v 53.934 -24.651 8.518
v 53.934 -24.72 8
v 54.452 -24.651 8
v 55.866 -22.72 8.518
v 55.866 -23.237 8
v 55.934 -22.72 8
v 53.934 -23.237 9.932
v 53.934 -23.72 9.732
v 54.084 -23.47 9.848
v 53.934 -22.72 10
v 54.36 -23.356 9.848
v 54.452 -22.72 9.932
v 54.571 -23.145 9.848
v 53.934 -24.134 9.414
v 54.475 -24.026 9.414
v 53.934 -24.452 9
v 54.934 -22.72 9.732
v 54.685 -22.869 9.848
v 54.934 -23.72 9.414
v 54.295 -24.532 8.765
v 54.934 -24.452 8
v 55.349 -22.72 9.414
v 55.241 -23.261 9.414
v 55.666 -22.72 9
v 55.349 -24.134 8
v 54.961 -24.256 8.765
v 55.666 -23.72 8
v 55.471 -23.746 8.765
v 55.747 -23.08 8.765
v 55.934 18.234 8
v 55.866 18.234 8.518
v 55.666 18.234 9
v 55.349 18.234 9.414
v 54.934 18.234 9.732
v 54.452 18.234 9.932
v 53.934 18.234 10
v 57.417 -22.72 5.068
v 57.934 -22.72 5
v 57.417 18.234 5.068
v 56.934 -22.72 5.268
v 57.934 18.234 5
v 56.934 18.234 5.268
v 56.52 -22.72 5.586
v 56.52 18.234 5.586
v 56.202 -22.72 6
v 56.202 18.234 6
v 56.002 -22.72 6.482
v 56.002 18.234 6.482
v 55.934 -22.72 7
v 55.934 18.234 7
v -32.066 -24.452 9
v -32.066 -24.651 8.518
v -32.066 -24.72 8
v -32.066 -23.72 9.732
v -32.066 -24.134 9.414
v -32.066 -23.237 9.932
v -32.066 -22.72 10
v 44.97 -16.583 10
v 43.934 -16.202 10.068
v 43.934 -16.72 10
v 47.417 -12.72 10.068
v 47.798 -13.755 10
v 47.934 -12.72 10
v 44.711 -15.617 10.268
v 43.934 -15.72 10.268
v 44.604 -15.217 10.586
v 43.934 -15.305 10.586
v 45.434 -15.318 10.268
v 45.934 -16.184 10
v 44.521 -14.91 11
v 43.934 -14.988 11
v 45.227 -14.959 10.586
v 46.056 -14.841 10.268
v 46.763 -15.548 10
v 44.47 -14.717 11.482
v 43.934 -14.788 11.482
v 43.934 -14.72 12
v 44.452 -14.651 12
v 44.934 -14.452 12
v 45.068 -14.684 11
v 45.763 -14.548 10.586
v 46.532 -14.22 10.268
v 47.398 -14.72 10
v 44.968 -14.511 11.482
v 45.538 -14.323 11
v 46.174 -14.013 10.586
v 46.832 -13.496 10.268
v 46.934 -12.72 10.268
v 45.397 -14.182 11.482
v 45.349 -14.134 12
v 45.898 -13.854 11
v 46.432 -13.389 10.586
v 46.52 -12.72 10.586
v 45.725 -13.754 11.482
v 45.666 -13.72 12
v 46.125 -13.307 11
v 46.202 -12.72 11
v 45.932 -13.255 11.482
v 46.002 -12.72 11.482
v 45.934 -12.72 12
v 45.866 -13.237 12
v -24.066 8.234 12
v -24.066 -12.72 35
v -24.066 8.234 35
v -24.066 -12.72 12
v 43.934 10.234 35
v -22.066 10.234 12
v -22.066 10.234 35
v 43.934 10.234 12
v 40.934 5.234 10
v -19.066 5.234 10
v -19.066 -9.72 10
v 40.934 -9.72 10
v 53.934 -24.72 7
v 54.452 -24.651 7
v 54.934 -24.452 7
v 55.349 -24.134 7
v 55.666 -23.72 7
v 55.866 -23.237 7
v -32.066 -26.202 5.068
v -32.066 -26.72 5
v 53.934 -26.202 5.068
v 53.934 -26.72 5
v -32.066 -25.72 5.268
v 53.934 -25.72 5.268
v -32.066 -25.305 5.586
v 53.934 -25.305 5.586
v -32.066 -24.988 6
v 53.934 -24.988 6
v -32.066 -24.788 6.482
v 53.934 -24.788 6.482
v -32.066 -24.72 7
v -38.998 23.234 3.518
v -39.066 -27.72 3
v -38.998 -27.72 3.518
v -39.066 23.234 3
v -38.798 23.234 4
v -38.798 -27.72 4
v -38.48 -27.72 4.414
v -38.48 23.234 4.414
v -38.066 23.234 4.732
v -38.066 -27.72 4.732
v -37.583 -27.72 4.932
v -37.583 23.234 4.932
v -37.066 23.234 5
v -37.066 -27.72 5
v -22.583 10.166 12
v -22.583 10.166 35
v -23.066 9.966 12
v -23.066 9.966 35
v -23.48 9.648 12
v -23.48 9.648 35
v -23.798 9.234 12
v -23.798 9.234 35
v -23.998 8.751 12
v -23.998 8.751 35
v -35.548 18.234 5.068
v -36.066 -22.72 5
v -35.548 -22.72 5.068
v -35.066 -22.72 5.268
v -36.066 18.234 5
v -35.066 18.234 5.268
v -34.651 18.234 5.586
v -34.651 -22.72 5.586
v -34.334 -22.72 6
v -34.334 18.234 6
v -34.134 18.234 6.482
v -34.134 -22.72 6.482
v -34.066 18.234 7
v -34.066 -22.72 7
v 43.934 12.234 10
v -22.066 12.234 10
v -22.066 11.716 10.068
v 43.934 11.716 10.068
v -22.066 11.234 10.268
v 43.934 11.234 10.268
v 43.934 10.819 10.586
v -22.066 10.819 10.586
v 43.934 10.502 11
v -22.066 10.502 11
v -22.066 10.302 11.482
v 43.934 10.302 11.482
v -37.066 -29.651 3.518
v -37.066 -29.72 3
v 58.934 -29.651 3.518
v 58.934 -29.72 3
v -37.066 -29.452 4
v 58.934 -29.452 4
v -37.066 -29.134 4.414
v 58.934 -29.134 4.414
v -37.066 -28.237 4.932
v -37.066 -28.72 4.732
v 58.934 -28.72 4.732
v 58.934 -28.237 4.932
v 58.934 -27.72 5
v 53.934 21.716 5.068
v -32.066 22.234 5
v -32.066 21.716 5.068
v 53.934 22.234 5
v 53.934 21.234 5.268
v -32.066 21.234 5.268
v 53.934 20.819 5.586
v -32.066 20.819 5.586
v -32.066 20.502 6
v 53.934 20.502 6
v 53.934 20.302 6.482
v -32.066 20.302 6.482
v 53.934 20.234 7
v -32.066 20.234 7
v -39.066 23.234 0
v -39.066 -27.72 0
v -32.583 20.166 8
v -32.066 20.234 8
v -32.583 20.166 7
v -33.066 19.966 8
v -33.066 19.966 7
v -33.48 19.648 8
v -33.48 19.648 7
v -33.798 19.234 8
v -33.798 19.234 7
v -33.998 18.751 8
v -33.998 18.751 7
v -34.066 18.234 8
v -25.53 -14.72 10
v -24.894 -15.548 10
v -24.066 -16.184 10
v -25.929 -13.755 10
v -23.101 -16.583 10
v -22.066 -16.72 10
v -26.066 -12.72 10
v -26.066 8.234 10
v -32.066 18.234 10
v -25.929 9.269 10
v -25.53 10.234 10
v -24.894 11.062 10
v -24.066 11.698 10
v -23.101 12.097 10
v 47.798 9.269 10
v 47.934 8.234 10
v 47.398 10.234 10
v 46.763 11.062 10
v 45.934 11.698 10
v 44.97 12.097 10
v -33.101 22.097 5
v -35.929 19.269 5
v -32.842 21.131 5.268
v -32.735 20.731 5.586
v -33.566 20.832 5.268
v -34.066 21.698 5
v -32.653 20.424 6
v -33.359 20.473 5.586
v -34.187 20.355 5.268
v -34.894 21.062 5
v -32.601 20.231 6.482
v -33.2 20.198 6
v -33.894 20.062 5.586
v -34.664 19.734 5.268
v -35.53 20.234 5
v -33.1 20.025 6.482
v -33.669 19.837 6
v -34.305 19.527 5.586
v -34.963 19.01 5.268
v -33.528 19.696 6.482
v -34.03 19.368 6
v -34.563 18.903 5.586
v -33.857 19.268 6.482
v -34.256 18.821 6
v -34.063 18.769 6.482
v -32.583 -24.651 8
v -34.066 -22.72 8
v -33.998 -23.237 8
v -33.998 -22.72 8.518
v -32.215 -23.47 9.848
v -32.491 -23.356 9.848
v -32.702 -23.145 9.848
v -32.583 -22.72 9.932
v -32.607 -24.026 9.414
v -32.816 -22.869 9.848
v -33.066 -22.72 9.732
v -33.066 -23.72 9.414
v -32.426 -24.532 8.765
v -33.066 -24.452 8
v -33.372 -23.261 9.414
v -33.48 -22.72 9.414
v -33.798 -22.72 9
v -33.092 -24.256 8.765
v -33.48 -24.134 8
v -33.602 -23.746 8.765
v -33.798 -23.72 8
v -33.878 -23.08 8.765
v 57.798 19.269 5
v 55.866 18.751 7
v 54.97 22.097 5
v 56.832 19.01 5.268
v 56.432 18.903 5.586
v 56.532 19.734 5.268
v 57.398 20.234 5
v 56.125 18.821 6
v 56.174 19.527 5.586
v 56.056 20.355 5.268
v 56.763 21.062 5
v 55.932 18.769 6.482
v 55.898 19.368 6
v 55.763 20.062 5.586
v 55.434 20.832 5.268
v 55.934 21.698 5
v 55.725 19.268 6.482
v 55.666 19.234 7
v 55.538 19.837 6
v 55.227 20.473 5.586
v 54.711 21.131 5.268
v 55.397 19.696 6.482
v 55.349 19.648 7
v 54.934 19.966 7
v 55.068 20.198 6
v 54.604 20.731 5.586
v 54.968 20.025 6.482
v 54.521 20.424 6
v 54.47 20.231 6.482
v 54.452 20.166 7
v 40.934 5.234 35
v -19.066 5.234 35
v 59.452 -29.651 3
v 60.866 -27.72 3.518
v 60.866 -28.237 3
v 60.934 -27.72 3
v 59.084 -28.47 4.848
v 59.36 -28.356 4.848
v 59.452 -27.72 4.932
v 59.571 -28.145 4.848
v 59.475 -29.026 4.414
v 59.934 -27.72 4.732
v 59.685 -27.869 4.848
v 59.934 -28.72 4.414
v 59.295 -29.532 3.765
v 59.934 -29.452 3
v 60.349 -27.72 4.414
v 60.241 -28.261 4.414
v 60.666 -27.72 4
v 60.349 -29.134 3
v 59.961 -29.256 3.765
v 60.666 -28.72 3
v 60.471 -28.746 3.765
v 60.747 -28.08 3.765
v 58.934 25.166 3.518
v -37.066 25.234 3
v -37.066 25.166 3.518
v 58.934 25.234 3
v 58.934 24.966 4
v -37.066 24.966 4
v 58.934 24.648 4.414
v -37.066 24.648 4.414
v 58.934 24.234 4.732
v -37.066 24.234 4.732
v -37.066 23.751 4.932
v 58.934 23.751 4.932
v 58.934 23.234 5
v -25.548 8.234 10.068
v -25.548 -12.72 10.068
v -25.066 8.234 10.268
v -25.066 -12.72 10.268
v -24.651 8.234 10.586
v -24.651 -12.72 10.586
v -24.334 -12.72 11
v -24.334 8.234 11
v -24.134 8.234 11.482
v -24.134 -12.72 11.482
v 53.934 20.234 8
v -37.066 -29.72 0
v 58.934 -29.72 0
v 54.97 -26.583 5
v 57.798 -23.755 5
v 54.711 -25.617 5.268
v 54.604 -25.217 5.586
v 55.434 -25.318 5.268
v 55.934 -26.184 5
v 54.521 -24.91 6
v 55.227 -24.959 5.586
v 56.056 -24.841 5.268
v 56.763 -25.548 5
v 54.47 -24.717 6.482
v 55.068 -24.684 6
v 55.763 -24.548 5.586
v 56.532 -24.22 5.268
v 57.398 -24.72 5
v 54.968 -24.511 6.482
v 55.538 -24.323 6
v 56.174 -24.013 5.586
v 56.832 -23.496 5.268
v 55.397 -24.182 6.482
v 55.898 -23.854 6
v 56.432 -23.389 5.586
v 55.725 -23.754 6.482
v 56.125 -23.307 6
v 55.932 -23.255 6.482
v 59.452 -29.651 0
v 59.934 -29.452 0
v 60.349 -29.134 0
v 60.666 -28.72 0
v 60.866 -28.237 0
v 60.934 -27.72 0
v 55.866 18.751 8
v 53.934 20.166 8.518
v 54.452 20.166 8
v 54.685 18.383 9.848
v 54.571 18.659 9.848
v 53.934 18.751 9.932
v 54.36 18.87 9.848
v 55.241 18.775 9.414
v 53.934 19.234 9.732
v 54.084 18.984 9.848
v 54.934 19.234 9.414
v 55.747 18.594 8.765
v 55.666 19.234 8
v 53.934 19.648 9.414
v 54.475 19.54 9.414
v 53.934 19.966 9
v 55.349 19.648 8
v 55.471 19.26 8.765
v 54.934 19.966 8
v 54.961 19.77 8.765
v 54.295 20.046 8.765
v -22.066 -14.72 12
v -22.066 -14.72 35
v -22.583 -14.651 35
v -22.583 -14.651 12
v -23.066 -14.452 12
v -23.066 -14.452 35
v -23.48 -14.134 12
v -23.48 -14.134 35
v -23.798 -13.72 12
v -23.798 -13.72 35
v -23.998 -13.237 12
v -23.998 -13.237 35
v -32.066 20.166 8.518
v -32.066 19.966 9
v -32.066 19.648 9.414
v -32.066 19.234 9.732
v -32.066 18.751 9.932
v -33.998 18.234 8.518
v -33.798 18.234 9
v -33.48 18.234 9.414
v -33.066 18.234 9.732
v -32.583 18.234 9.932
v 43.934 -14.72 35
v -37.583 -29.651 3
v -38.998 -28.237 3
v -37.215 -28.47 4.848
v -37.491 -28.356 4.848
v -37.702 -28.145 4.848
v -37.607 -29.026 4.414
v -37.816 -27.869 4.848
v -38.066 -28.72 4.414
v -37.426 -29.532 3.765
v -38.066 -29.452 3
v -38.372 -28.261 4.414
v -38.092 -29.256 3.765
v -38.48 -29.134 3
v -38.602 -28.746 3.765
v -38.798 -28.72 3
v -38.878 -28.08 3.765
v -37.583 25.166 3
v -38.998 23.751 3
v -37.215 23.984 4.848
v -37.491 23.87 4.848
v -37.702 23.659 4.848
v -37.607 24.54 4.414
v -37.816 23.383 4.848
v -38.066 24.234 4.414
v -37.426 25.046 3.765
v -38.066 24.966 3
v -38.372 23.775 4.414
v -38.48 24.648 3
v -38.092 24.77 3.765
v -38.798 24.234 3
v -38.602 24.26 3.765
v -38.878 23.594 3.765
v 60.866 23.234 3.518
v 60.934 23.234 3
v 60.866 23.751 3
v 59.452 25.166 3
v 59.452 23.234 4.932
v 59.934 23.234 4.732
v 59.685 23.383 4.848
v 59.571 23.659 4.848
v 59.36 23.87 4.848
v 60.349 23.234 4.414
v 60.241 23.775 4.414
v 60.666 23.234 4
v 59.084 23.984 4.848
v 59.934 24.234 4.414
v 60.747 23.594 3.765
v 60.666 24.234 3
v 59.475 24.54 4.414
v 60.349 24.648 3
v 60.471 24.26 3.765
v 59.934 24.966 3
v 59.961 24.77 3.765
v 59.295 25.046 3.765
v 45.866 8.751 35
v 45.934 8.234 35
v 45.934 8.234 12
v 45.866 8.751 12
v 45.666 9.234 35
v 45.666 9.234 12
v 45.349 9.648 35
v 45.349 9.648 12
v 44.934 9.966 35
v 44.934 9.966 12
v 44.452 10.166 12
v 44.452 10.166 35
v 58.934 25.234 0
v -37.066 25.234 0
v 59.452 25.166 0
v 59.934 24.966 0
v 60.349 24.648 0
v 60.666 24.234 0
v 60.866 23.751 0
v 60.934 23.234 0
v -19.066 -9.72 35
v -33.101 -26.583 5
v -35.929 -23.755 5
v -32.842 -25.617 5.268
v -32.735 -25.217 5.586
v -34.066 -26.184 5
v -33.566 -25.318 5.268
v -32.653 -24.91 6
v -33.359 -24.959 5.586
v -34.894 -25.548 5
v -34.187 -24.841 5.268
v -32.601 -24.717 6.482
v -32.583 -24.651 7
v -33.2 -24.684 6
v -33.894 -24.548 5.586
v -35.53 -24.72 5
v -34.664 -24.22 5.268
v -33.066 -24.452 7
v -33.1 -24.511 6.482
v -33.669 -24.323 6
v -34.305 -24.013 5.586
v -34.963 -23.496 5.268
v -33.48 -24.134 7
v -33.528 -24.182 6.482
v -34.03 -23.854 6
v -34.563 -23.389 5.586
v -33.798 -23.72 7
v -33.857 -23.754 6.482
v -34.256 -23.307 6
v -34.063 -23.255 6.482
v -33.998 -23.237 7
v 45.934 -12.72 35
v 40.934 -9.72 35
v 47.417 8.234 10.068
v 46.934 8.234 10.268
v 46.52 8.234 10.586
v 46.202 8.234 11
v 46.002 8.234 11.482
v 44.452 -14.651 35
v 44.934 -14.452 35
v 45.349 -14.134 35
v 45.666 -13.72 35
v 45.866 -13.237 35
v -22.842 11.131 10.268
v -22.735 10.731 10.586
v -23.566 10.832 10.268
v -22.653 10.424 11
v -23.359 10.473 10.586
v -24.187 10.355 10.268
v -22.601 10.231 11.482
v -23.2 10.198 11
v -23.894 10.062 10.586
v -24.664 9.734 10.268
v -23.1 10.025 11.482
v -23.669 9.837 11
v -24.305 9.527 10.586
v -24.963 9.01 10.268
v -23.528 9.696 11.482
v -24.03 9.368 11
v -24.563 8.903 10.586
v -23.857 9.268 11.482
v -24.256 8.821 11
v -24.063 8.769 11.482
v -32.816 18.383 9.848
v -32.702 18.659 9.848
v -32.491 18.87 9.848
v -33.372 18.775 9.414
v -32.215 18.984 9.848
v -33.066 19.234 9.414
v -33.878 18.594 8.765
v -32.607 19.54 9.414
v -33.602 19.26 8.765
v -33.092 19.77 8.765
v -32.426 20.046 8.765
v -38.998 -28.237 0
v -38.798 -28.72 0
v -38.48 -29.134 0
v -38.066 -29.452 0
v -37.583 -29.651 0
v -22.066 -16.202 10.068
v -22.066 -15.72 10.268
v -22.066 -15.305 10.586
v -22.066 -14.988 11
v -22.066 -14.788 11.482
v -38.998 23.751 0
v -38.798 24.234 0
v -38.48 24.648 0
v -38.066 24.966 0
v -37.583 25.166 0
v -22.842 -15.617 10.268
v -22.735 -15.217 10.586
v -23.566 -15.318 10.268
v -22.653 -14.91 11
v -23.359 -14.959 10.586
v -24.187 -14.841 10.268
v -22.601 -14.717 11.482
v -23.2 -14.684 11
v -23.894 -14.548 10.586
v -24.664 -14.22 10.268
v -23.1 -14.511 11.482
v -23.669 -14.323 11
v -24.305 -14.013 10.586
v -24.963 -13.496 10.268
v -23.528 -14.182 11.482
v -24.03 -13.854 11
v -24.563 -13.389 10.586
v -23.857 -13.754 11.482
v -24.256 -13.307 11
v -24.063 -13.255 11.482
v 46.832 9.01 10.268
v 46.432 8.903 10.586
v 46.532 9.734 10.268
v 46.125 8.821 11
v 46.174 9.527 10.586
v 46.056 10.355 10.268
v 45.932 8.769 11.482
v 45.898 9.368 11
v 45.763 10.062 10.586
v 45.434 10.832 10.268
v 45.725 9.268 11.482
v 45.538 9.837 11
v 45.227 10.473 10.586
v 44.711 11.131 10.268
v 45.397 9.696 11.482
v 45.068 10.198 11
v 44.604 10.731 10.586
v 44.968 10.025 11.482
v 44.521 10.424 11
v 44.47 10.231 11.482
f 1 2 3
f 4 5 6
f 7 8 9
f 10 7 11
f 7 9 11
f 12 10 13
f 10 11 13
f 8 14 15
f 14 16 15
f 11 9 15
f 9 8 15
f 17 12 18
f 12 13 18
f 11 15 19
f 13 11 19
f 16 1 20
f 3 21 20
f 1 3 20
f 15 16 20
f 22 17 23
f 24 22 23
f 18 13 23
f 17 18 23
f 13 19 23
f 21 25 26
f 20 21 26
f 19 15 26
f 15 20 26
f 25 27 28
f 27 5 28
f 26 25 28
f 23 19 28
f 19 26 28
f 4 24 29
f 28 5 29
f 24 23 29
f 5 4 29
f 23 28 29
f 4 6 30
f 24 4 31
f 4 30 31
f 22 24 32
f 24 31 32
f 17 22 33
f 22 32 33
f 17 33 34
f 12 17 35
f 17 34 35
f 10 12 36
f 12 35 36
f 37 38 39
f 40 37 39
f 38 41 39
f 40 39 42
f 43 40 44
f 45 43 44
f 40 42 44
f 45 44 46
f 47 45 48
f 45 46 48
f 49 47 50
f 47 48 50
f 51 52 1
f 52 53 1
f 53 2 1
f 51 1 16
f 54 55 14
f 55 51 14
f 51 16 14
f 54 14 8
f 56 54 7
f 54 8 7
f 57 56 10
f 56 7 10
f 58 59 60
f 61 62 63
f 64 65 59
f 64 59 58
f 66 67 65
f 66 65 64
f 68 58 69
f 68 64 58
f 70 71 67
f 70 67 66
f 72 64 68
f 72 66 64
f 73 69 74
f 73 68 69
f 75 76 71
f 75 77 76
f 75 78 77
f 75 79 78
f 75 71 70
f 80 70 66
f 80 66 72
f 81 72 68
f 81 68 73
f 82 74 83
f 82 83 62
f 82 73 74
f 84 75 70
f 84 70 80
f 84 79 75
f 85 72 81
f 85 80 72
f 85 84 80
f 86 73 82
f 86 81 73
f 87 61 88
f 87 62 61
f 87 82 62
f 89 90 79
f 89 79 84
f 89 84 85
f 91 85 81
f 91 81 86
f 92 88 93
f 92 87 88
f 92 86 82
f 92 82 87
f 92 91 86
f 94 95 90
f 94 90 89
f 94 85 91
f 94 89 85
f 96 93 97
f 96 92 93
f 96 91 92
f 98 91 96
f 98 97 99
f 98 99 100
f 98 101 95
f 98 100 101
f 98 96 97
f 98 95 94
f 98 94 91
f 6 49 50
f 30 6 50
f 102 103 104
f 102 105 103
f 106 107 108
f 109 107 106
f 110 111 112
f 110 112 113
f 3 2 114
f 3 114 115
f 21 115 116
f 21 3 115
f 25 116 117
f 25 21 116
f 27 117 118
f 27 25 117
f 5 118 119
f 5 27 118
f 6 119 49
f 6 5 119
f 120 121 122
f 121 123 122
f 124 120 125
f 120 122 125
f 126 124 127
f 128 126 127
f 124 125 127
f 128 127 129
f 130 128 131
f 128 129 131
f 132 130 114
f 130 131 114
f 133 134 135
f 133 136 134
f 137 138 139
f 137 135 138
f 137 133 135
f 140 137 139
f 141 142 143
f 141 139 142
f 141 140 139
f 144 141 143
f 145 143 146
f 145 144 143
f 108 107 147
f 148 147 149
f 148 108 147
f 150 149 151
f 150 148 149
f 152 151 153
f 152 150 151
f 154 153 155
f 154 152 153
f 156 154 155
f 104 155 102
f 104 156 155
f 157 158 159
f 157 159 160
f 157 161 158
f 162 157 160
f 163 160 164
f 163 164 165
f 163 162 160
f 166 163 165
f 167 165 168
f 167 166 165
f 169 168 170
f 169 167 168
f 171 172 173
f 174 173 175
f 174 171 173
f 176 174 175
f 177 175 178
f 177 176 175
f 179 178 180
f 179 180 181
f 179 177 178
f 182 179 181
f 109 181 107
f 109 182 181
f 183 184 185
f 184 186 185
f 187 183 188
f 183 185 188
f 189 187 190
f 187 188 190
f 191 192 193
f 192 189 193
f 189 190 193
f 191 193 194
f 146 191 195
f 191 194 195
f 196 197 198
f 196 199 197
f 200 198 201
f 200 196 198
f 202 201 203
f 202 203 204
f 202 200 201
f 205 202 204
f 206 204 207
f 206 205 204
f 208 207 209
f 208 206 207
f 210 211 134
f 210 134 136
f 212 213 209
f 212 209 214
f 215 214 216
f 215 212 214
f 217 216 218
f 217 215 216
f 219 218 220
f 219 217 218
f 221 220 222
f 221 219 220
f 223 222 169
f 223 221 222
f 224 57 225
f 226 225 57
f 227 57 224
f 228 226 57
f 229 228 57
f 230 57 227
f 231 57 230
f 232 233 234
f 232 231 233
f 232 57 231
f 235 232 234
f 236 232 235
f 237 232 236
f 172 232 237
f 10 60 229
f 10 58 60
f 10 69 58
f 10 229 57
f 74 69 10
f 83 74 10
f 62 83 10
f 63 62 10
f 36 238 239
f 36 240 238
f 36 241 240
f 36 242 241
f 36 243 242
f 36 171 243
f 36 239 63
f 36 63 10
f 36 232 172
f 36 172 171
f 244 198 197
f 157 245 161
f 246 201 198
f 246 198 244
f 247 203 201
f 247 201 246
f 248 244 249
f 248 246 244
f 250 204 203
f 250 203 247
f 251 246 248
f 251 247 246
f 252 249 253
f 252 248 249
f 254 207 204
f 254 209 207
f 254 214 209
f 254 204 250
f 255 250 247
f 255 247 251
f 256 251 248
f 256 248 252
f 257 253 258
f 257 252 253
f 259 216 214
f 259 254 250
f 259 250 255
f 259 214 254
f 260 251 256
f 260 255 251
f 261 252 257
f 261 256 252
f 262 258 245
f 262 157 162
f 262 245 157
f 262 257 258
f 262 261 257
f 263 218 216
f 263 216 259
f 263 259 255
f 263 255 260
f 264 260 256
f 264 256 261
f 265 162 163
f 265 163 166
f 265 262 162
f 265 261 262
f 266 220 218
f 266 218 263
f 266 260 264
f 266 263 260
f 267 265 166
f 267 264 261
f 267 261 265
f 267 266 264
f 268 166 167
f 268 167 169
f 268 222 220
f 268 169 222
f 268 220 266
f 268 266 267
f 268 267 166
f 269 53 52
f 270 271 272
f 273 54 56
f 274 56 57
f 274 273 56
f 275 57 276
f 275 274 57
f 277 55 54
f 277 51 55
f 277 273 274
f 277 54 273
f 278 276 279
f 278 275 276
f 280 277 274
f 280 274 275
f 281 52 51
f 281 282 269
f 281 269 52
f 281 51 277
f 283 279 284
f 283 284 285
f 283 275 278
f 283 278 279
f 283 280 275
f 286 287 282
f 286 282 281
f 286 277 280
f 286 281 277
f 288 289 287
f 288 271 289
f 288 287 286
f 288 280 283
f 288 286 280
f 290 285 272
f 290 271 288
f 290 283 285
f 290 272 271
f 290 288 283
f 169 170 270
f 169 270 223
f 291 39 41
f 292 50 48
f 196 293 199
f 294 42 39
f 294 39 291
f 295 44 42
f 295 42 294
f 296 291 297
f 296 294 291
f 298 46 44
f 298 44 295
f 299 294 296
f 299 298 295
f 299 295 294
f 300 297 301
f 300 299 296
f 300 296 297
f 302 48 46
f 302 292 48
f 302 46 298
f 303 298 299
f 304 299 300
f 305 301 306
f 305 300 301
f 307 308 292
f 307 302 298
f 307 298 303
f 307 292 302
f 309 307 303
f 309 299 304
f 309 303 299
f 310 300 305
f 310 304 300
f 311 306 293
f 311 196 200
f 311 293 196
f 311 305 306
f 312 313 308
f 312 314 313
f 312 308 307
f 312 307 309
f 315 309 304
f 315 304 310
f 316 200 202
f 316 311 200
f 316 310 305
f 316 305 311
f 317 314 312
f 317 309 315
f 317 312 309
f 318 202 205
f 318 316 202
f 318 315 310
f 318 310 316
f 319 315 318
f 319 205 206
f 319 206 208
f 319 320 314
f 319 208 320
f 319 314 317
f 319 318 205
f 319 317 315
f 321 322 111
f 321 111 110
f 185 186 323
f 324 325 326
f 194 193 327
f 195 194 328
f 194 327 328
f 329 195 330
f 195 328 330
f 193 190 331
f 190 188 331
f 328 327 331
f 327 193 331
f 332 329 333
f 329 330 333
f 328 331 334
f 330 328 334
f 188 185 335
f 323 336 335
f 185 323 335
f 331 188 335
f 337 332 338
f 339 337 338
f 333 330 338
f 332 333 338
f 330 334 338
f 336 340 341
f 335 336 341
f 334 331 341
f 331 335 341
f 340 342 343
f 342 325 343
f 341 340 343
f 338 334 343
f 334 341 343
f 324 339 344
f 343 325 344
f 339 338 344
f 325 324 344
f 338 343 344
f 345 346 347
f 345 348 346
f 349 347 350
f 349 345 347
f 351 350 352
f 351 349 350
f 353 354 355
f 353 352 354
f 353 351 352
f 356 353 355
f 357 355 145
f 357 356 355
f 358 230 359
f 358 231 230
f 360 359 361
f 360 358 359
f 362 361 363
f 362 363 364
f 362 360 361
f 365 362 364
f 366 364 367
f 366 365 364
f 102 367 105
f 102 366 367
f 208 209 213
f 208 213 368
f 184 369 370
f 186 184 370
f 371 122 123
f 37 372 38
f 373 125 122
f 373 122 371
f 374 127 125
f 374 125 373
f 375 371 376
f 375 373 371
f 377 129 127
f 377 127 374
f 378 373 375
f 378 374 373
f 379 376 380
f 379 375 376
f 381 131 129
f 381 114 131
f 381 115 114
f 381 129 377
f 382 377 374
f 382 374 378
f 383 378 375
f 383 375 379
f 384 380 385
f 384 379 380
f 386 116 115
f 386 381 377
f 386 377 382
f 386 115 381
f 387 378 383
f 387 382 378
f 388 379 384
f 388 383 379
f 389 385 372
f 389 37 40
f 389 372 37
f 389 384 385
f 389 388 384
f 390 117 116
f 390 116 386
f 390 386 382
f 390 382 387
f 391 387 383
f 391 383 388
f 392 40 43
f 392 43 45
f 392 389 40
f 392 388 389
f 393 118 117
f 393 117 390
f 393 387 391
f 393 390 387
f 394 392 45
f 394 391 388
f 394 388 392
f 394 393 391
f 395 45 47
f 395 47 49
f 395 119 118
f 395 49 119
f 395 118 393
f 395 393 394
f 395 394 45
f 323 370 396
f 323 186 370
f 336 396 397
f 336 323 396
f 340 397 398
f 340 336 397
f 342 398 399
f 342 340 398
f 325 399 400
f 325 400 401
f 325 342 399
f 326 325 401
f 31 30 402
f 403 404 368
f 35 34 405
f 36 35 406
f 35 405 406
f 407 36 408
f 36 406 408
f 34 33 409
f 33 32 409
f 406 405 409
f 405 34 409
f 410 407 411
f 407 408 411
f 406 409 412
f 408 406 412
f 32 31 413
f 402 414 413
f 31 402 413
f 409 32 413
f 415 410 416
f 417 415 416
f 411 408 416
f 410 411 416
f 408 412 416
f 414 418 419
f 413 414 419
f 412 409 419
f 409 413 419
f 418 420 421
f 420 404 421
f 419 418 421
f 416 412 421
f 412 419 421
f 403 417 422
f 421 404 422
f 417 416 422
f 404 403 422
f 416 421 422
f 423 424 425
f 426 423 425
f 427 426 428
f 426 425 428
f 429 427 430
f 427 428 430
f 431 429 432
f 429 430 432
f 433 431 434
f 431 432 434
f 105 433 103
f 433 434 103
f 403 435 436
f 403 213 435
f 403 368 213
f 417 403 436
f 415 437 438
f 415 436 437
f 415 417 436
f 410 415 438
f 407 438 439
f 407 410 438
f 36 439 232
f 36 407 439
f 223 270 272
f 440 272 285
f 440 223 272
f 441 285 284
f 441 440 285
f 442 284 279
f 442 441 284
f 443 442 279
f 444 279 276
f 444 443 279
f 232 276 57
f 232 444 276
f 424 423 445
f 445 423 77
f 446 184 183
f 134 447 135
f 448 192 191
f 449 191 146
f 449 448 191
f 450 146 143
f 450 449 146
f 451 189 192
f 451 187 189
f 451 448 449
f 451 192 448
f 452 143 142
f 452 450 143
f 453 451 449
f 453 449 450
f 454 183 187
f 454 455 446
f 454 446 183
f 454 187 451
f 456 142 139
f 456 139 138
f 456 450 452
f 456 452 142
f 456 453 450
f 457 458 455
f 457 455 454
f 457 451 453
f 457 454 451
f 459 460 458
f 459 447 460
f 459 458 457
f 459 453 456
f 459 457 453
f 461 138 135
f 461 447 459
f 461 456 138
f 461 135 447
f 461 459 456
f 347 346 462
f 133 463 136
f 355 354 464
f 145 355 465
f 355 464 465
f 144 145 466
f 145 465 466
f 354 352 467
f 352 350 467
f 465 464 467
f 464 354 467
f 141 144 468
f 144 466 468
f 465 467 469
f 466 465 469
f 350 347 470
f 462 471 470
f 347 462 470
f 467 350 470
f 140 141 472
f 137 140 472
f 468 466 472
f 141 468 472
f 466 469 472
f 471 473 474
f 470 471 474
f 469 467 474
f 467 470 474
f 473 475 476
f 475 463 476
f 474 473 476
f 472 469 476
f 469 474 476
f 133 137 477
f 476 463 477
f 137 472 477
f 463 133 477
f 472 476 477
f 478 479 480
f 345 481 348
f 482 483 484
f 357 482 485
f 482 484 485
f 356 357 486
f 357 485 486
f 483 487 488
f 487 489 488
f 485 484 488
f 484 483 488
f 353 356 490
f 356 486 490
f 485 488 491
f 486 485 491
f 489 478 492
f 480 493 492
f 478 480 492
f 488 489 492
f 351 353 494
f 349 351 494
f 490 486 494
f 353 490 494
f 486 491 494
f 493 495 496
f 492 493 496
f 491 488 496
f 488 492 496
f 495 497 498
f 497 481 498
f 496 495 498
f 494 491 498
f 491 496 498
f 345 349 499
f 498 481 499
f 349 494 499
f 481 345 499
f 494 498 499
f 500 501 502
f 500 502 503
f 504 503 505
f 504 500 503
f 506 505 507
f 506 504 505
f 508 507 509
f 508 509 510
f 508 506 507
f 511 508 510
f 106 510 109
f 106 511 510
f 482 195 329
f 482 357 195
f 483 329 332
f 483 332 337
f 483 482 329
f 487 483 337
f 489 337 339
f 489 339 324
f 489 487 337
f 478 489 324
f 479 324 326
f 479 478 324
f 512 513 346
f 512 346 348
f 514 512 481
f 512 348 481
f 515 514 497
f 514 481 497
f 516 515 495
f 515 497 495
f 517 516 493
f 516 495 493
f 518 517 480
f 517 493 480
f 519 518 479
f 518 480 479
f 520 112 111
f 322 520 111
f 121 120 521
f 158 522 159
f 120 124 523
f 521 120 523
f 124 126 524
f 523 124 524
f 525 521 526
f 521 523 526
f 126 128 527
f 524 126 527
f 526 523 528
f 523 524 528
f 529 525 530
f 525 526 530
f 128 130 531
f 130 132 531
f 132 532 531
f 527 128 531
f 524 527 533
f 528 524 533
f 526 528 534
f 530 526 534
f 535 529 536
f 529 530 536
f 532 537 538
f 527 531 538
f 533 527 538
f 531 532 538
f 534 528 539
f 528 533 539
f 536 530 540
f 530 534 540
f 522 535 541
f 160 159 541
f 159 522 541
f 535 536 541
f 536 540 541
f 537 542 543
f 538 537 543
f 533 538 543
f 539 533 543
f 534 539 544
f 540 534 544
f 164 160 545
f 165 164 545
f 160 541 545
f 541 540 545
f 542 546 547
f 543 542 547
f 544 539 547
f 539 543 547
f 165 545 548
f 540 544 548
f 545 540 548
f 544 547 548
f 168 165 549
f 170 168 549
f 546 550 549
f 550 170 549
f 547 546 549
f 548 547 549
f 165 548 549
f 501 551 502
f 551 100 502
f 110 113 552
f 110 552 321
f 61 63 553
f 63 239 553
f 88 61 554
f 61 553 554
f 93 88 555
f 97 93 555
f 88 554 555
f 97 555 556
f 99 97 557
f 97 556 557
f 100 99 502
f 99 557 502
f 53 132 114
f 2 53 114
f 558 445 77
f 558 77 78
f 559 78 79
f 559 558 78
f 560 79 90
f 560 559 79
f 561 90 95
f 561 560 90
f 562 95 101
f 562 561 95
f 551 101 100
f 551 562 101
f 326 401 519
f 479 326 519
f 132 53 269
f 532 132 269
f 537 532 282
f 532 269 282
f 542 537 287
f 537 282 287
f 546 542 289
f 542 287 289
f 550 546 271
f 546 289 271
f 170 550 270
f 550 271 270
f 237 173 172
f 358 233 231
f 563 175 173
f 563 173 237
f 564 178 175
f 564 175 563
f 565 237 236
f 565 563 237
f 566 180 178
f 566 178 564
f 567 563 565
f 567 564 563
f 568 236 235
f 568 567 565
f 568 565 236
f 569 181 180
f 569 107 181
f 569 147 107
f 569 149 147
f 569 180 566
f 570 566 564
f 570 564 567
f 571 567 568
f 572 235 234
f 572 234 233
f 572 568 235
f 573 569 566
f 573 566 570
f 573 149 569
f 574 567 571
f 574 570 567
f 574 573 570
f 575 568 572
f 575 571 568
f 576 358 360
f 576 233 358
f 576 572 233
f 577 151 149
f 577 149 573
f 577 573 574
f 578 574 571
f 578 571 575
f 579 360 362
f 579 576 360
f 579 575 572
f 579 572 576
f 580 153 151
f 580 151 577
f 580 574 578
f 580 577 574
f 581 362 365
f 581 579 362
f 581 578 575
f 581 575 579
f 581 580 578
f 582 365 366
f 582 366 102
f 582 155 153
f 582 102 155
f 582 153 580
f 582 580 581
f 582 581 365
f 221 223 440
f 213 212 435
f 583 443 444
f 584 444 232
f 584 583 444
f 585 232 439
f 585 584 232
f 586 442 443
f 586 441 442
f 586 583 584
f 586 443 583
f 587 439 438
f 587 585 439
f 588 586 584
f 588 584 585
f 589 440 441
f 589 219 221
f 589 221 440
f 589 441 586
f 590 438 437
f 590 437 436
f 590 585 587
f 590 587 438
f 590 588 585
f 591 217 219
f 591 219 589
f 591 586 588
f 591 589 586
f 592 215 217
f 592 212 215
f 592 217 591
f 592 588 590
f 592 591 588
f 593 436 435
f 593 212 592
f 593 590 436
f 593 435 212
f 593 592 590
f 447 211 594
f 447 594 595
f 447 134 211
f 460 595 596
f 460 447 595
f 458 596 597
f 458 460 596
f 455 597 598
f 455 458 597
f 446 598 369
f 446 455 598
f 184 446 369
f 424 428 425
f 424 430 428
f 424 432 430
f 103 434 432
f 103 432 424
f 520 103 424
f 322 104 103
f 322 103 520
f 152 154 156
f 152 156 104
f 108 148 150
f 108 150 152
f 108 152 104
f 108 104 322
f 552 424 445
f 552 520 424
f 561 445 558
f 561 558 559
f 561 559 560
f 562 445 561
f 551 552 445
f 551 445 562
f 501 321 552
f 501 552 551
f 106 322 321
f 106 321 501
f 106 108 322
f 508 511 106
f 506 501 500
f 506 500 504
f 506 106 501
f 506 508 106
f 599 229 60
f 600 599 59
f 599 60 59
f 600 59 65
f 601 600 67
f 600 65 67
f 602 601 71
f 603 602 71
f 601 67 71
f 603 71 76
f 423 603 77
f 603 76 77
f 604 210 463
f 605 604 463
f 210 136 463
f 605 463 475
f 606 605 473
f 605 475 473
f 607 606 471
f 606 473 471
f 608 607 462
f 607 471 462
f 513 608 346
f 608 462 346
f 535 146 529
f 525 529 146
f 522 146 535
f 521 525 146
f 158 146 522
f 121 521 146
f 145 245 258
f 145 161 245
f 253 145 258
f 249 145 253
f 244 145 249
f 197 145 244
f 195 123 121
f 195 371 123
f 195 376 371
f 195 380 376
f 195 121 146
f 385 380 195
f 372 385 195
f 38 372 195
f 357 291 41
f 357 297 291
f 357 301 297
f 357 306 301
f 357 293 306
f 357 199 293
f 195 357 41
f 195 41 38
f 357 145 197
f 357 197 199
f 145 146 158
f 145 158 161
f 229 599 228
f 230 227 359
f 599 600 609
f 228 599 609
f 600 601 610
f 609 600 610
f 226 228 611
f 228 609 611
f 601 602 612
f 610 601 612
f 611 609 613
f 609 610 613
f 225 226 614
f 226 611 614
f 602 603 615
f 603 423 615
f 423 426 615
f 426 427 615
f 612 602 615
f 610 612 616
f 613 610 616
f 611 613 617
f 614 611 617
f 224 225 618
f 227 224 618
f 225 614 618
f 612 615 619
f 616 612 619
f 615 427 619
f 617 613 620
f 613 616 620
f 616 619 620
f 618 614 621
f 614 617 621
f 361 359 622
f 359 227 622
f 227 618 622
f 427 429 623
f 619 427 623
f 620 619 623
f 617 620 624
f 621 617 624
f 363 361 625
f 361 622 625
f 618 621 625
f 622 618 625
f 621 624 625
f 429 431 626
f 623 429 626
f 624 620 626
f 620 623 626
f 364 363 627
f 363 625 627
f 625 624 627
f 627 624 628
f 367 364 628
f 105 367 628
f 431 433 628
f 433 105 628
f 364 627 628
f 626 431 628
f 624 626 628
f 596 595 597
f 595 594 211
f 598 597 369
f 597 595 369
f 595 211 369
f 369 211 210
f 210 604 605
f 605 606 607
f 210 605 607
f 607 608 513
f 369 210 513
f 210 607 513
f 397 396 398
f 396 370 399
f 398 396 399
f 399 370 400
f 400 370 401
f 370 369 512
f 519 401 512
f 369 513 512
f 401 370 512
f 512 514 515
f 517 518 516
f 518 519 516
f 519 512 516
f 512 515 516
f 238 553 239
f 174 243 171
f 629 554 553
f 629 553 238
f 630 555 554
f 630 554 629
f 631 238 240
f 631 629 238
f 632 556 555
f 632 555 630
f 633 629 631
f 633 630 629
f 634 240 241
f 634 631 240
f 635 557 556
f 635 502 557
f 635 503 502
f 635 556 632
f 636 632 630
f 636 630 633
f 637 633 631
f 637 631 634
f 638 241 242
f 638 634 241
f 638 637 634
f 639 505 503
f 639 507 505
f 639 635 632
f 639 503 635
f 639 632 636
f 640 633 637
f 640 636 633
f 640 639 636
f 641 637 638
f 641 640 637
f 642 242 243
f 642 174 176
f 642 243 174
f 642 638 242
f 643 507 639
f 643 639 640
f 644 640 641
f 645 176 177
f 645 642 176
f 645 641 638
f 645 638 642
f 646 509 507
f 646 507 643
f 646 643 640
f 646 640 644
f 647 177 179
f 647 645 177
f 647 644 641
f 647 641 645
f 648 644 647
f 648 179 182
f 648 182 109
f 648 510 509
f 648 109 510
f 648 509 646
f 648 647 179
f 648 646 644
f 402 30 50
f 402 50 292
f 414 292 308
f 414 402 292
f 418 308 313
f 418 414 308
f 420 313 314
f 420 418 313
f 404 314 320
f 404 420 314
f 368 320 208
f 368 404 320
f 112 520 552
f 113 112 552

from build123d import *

# Parameters (mm, degrees)
F0_W     = 100
F0_H     = 54.953308776
F1_DEPTH = 5
F2_W     = 90
F2_H     = 44.953308776
F3_DEPTH = 5
F4_W     = 70
F4_H     = 24.953308776
F5_DEPTH = 25
F6_R     = 2
F7_W     = 60
F7_H     = 14.953308776
F8_DEPTH = 25


with BuildPart() as f1:
    # F0 (on Top) → F1 (new body)
    with BuildSketch(Plane.XY):
        with Locations((10.9343037009, -2.2429926321)):
            Rectangle(F0_W, F0_H)
    extrude(amount=F1_DEPTH)

    # F2 (on face) → F3 (join)
    with BuildSketch(Plane.XY.offset(5)):
        with Locations((10.9343037009, -2.2429926321)):
            Rectangle(F2_W, F2_H)
    extrude(amount=F3_DEPTH)

    # F4 (on face) → F5 (join)
    with BuildSketch(Plane.XY.offset(10)):
        with Locations((10.9343037009, -2.2429926321)):
            Rectangle(F4_W, F4_H)
    extrude(amount=F5_DEPTH)

    # F6
    f6_edges = [f1.edges().sort_by_distance(p)[0] for p in [
        (60.934304, 25.233662, 2.5),
        (-39.065696, 25.233662, 2.5),
        (-39.065696, -29.719647, 2.5),
        (60.934304, -29.719647, 2.5),
        (45.934304, -14.719647, 22.5),
        (45.934304, 10.233662, 22.5),
        (55.934304, 20.233662, 7.5),
        (55.934304, -24.719647, 7.5),
        (-24.065696, -14.719647, 22.5),
        (-24.065696, 10.233662, 22.5),
        (-34.065696, -24.719647, 7.5),
        (-34.065696, 20.233662, 7.5),
        (10.934304, -24.719647, 5),
        (10.934304, -14.719647, 10),
        (10.934304, -24.719647, 10),
        (10.934304, -29.719647, 5),
        (60.934304, -2.242993, 5),
        (10.934304, 25.233662, 5),
        (-39.065696, -2.242993, 5),
        (55.934304, -2.242993, 5),
        (10.934304, 20.233662, 5),
        (-34.065696, -2.242993, 5),
        (45.934304, -2.242993, 10),
        (-34.065696, -2.242993, 10),
        (55.934304, -2.242993, 10),
        (10.934304, 20.233662, 10),
        (10.934304, 10.233662, 10),
        (-24.065696, -2.242993, 10),
    ]]
    fillet(f6_edges, radius=F6_R)

    # F7 (on face) → F8 (cut)
    with BuildSketch(Plane.XY.offset(35)):
        with Locations((10.9343037009, -2.2429926321)):
            Rectangle(F7_W, F7_H)
    extrude(amount=-F8_DEPTH, mode=Mode.SUBTRACT)


solid = f1.part
